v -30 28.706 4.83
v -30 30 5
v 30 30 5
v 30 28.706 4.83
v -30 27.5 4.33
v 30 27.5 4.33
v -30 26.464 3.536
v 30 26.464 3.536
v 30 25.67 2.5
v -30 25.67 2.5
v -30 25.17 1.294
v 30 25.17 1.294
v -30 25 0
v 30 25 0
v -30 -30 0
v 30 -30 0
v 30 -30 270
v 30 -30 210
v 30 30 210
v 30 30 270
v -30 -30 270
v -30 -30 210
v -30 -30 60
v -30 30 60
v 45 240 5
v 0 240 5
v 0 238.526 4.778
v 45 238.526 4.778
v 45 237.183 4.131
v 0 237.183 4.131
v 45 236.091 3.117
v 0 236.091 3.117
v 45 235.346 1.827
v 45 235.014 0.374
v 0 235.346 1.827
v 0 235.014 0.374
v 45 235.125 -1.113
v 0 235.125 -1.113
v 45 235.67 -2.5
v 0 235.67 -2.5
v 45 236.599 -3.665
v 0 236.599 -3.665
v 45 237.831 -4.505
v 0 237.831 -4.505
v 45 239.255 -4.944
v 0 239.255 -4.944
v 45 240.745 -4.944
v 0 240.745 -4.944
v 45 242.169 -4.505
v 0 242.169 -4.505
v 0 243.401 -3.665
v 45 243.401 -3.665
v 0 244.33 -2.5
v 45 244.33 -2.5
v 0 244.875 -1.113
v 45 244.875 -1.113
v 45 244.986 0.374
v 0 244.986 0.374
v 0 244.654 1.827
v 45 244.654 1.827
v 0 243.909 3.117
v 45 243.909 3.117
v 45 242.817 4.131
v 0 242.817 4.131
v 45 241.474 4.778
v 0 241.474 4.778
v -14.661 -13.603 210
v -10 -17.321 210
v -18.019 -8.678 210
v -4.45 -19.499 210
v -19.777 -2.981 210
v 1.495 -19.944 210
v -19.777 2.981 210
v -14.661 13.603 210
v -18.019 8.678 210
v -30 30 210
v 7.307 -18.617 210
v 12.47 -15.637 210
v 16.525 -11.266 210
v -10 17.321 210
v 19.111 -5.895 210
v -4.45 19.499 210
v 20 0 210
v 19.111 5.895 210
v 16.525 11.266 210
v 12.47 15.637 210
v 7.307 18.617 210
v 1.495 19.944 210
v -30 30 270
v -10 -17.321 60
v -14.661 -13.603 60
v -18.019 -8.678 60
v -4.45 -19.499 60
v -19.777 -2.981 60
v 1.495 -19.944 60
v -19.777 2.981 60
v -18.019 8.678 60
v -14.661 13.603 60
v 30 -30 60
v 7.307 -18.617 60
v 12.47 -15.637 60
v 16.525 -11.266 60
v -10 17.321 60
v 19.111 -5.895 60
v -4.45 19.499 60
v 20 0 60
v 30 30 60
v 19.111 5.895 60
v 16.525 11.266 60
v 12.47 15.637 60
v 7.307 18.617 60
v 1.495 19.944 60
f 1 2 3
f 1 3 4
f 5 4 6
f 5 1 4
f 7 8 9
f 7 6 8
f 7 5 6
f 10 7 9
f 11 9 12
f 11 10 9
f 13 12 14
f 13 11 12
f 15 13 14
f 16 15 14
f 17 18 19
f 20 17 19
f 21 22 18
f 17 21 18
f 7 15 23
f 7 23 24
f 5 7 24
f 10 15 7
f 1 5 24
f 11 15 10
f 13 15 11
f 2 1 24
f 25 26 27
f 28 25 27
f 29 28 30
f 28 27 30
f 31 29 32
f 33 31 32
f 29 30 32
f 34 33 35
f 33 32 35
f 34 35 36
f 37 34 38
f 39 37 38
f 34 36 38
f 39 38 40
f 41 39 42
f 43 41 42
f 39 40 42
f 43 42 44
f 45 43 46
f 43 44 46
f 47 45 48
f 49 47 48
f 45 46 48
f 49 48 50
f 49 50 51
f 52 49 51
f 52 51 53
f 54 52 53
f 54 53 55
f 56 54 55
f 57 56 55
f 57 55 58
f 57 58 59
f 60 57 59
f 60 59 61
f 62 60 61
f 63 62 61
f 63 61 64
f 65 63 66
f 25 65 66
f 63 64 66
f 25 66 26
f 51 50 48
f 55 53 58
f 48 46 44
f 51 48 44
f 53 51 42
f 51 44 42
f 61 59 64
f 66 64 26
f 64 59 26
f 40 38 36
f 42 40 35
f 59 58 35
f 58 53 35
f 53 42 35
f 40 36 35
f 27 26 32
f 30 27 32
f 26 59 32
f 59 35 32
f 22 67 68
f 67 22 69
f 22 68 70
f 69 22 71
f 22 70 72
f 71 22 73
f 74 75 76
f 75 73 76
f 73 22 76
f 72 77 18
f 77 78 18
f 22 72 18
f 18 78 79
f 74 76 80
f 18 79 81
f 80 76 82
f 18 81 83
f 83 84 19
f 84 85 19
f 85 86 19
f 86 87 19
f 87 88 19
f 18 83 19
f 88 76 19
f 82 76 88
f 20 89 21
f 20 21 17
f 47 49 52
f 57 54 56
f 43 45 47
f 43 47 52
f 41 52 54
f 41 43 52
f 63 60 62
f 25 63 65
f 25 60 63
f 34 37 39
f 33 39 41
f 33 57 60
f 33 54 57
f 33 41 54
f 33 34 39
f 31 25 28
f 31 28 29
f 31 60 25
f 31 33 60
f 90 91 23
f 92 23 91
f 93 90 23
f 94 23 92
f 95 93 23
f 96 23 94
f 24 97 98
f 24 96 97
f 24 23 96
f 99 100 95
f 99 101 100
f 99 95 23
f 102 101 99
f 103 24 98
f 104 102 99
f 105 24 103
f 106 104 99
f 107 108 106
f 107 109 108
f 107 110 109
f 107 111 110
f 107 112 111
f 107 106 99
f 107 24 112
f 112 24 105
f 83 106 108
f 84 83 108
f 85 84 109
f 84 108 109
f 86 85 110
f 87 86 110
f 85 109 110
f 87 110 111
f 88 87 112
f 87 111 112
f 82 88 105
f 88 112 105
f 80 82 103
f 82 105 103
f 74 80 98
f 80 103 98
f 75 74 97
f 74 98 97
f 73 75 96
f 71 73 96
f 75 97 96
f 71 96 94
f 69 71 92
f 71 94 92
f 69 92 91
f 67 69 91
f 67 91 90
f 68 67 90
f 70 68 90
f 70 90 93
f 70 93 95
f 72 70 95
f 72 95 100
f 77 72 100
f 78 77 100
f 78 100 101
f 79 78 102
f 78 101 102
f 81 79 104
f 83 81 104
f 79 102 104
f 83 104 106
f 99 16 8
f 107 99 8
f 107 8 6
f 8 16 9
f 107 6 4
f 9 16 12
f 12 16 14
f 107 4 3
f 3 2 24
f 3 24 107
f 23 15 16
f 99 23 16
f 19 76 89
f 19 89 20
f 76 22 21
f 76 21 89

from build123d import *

# Parameters (mm, degrees)
SKETCH1_W               = 60
SKETCH1_H               = 60
BOSS_EXTRUDE1_DEPTH     = 60
SKETCH2_R               = 20
BOSS_EXTRUDE2_DEPTH     = 150
SKETCH3_W               = 60
SKETCH3_H               = 60
BOSS_EXTRUDE3_DEPTH     = 60
CUT_EXTRUDE1_DEPTH      = 100
CUT_EXTRUDE1_DEPTH_BACK = 100
SKETCH4_R               = 5
SKETCH6_R               = 5
BOSS_EXTRUDE4_DEPTH     = 45


with BuildPart() as part:
    # Sketch1 → Boss-Extrude1 (new body)
    with BuildSketch(Plane.XY):
        Rectangle(SKETCH1_W, SKETCH1_H)
    extrude(amount=BOSS_EXTRUDE1_DEPTH)

    # Sketch2 → Boss-Extrude2 (add)
    with BuildSketch(Plane.XY.offset(60)):
        Circle(SKETCH2_R)
    extrude(amount=BOSS_EXTRUDE2_DEPTH)

    # Sketch3 → Boss-Extrude3 (add)
    with BuildSketch(Plane.XY.offset(210)):
        Rectangle(SKETCH3_W, SKETCH3_H)
    extrude(amount=BOSS_EXTRUDE3_DEPTH)

    # Sketch4 → Cut-Extrude1 (cut, two sides: drawn at the far end of the back side and taken through both)
    with BuildSketch(Plane(origin=(0, 0, 0), x_dir=(0, 0, -1), z_dir=(1, 0, 0)).offset(-CUT_EXTRUDE1_DEPTH_BACK)):
        with Locations((0, 30)):
            Circle(SKETCH4_R)
    extrude(amount=CUT_EXTRUDE1_DEPTH + CUT_EXTRUDE1_DEPTH_BACK, mode=Mode.SUBTRACT)


with BuildPart() as body_2:
    # Sketch6 → Boss-Extrude4 (new body)
    with BuildSketch(Plane(origin=(0, 0, 0), x_dir=(0, 0, -1), z_dir=(1, 0, 0))):
        with Locations((0, 240)):
            Circle(SKETCH6_R)
    extrude(amount=BOSS_EXTRUDE4_DEPTH)


solid = Compound([part.part, body_2.part])
